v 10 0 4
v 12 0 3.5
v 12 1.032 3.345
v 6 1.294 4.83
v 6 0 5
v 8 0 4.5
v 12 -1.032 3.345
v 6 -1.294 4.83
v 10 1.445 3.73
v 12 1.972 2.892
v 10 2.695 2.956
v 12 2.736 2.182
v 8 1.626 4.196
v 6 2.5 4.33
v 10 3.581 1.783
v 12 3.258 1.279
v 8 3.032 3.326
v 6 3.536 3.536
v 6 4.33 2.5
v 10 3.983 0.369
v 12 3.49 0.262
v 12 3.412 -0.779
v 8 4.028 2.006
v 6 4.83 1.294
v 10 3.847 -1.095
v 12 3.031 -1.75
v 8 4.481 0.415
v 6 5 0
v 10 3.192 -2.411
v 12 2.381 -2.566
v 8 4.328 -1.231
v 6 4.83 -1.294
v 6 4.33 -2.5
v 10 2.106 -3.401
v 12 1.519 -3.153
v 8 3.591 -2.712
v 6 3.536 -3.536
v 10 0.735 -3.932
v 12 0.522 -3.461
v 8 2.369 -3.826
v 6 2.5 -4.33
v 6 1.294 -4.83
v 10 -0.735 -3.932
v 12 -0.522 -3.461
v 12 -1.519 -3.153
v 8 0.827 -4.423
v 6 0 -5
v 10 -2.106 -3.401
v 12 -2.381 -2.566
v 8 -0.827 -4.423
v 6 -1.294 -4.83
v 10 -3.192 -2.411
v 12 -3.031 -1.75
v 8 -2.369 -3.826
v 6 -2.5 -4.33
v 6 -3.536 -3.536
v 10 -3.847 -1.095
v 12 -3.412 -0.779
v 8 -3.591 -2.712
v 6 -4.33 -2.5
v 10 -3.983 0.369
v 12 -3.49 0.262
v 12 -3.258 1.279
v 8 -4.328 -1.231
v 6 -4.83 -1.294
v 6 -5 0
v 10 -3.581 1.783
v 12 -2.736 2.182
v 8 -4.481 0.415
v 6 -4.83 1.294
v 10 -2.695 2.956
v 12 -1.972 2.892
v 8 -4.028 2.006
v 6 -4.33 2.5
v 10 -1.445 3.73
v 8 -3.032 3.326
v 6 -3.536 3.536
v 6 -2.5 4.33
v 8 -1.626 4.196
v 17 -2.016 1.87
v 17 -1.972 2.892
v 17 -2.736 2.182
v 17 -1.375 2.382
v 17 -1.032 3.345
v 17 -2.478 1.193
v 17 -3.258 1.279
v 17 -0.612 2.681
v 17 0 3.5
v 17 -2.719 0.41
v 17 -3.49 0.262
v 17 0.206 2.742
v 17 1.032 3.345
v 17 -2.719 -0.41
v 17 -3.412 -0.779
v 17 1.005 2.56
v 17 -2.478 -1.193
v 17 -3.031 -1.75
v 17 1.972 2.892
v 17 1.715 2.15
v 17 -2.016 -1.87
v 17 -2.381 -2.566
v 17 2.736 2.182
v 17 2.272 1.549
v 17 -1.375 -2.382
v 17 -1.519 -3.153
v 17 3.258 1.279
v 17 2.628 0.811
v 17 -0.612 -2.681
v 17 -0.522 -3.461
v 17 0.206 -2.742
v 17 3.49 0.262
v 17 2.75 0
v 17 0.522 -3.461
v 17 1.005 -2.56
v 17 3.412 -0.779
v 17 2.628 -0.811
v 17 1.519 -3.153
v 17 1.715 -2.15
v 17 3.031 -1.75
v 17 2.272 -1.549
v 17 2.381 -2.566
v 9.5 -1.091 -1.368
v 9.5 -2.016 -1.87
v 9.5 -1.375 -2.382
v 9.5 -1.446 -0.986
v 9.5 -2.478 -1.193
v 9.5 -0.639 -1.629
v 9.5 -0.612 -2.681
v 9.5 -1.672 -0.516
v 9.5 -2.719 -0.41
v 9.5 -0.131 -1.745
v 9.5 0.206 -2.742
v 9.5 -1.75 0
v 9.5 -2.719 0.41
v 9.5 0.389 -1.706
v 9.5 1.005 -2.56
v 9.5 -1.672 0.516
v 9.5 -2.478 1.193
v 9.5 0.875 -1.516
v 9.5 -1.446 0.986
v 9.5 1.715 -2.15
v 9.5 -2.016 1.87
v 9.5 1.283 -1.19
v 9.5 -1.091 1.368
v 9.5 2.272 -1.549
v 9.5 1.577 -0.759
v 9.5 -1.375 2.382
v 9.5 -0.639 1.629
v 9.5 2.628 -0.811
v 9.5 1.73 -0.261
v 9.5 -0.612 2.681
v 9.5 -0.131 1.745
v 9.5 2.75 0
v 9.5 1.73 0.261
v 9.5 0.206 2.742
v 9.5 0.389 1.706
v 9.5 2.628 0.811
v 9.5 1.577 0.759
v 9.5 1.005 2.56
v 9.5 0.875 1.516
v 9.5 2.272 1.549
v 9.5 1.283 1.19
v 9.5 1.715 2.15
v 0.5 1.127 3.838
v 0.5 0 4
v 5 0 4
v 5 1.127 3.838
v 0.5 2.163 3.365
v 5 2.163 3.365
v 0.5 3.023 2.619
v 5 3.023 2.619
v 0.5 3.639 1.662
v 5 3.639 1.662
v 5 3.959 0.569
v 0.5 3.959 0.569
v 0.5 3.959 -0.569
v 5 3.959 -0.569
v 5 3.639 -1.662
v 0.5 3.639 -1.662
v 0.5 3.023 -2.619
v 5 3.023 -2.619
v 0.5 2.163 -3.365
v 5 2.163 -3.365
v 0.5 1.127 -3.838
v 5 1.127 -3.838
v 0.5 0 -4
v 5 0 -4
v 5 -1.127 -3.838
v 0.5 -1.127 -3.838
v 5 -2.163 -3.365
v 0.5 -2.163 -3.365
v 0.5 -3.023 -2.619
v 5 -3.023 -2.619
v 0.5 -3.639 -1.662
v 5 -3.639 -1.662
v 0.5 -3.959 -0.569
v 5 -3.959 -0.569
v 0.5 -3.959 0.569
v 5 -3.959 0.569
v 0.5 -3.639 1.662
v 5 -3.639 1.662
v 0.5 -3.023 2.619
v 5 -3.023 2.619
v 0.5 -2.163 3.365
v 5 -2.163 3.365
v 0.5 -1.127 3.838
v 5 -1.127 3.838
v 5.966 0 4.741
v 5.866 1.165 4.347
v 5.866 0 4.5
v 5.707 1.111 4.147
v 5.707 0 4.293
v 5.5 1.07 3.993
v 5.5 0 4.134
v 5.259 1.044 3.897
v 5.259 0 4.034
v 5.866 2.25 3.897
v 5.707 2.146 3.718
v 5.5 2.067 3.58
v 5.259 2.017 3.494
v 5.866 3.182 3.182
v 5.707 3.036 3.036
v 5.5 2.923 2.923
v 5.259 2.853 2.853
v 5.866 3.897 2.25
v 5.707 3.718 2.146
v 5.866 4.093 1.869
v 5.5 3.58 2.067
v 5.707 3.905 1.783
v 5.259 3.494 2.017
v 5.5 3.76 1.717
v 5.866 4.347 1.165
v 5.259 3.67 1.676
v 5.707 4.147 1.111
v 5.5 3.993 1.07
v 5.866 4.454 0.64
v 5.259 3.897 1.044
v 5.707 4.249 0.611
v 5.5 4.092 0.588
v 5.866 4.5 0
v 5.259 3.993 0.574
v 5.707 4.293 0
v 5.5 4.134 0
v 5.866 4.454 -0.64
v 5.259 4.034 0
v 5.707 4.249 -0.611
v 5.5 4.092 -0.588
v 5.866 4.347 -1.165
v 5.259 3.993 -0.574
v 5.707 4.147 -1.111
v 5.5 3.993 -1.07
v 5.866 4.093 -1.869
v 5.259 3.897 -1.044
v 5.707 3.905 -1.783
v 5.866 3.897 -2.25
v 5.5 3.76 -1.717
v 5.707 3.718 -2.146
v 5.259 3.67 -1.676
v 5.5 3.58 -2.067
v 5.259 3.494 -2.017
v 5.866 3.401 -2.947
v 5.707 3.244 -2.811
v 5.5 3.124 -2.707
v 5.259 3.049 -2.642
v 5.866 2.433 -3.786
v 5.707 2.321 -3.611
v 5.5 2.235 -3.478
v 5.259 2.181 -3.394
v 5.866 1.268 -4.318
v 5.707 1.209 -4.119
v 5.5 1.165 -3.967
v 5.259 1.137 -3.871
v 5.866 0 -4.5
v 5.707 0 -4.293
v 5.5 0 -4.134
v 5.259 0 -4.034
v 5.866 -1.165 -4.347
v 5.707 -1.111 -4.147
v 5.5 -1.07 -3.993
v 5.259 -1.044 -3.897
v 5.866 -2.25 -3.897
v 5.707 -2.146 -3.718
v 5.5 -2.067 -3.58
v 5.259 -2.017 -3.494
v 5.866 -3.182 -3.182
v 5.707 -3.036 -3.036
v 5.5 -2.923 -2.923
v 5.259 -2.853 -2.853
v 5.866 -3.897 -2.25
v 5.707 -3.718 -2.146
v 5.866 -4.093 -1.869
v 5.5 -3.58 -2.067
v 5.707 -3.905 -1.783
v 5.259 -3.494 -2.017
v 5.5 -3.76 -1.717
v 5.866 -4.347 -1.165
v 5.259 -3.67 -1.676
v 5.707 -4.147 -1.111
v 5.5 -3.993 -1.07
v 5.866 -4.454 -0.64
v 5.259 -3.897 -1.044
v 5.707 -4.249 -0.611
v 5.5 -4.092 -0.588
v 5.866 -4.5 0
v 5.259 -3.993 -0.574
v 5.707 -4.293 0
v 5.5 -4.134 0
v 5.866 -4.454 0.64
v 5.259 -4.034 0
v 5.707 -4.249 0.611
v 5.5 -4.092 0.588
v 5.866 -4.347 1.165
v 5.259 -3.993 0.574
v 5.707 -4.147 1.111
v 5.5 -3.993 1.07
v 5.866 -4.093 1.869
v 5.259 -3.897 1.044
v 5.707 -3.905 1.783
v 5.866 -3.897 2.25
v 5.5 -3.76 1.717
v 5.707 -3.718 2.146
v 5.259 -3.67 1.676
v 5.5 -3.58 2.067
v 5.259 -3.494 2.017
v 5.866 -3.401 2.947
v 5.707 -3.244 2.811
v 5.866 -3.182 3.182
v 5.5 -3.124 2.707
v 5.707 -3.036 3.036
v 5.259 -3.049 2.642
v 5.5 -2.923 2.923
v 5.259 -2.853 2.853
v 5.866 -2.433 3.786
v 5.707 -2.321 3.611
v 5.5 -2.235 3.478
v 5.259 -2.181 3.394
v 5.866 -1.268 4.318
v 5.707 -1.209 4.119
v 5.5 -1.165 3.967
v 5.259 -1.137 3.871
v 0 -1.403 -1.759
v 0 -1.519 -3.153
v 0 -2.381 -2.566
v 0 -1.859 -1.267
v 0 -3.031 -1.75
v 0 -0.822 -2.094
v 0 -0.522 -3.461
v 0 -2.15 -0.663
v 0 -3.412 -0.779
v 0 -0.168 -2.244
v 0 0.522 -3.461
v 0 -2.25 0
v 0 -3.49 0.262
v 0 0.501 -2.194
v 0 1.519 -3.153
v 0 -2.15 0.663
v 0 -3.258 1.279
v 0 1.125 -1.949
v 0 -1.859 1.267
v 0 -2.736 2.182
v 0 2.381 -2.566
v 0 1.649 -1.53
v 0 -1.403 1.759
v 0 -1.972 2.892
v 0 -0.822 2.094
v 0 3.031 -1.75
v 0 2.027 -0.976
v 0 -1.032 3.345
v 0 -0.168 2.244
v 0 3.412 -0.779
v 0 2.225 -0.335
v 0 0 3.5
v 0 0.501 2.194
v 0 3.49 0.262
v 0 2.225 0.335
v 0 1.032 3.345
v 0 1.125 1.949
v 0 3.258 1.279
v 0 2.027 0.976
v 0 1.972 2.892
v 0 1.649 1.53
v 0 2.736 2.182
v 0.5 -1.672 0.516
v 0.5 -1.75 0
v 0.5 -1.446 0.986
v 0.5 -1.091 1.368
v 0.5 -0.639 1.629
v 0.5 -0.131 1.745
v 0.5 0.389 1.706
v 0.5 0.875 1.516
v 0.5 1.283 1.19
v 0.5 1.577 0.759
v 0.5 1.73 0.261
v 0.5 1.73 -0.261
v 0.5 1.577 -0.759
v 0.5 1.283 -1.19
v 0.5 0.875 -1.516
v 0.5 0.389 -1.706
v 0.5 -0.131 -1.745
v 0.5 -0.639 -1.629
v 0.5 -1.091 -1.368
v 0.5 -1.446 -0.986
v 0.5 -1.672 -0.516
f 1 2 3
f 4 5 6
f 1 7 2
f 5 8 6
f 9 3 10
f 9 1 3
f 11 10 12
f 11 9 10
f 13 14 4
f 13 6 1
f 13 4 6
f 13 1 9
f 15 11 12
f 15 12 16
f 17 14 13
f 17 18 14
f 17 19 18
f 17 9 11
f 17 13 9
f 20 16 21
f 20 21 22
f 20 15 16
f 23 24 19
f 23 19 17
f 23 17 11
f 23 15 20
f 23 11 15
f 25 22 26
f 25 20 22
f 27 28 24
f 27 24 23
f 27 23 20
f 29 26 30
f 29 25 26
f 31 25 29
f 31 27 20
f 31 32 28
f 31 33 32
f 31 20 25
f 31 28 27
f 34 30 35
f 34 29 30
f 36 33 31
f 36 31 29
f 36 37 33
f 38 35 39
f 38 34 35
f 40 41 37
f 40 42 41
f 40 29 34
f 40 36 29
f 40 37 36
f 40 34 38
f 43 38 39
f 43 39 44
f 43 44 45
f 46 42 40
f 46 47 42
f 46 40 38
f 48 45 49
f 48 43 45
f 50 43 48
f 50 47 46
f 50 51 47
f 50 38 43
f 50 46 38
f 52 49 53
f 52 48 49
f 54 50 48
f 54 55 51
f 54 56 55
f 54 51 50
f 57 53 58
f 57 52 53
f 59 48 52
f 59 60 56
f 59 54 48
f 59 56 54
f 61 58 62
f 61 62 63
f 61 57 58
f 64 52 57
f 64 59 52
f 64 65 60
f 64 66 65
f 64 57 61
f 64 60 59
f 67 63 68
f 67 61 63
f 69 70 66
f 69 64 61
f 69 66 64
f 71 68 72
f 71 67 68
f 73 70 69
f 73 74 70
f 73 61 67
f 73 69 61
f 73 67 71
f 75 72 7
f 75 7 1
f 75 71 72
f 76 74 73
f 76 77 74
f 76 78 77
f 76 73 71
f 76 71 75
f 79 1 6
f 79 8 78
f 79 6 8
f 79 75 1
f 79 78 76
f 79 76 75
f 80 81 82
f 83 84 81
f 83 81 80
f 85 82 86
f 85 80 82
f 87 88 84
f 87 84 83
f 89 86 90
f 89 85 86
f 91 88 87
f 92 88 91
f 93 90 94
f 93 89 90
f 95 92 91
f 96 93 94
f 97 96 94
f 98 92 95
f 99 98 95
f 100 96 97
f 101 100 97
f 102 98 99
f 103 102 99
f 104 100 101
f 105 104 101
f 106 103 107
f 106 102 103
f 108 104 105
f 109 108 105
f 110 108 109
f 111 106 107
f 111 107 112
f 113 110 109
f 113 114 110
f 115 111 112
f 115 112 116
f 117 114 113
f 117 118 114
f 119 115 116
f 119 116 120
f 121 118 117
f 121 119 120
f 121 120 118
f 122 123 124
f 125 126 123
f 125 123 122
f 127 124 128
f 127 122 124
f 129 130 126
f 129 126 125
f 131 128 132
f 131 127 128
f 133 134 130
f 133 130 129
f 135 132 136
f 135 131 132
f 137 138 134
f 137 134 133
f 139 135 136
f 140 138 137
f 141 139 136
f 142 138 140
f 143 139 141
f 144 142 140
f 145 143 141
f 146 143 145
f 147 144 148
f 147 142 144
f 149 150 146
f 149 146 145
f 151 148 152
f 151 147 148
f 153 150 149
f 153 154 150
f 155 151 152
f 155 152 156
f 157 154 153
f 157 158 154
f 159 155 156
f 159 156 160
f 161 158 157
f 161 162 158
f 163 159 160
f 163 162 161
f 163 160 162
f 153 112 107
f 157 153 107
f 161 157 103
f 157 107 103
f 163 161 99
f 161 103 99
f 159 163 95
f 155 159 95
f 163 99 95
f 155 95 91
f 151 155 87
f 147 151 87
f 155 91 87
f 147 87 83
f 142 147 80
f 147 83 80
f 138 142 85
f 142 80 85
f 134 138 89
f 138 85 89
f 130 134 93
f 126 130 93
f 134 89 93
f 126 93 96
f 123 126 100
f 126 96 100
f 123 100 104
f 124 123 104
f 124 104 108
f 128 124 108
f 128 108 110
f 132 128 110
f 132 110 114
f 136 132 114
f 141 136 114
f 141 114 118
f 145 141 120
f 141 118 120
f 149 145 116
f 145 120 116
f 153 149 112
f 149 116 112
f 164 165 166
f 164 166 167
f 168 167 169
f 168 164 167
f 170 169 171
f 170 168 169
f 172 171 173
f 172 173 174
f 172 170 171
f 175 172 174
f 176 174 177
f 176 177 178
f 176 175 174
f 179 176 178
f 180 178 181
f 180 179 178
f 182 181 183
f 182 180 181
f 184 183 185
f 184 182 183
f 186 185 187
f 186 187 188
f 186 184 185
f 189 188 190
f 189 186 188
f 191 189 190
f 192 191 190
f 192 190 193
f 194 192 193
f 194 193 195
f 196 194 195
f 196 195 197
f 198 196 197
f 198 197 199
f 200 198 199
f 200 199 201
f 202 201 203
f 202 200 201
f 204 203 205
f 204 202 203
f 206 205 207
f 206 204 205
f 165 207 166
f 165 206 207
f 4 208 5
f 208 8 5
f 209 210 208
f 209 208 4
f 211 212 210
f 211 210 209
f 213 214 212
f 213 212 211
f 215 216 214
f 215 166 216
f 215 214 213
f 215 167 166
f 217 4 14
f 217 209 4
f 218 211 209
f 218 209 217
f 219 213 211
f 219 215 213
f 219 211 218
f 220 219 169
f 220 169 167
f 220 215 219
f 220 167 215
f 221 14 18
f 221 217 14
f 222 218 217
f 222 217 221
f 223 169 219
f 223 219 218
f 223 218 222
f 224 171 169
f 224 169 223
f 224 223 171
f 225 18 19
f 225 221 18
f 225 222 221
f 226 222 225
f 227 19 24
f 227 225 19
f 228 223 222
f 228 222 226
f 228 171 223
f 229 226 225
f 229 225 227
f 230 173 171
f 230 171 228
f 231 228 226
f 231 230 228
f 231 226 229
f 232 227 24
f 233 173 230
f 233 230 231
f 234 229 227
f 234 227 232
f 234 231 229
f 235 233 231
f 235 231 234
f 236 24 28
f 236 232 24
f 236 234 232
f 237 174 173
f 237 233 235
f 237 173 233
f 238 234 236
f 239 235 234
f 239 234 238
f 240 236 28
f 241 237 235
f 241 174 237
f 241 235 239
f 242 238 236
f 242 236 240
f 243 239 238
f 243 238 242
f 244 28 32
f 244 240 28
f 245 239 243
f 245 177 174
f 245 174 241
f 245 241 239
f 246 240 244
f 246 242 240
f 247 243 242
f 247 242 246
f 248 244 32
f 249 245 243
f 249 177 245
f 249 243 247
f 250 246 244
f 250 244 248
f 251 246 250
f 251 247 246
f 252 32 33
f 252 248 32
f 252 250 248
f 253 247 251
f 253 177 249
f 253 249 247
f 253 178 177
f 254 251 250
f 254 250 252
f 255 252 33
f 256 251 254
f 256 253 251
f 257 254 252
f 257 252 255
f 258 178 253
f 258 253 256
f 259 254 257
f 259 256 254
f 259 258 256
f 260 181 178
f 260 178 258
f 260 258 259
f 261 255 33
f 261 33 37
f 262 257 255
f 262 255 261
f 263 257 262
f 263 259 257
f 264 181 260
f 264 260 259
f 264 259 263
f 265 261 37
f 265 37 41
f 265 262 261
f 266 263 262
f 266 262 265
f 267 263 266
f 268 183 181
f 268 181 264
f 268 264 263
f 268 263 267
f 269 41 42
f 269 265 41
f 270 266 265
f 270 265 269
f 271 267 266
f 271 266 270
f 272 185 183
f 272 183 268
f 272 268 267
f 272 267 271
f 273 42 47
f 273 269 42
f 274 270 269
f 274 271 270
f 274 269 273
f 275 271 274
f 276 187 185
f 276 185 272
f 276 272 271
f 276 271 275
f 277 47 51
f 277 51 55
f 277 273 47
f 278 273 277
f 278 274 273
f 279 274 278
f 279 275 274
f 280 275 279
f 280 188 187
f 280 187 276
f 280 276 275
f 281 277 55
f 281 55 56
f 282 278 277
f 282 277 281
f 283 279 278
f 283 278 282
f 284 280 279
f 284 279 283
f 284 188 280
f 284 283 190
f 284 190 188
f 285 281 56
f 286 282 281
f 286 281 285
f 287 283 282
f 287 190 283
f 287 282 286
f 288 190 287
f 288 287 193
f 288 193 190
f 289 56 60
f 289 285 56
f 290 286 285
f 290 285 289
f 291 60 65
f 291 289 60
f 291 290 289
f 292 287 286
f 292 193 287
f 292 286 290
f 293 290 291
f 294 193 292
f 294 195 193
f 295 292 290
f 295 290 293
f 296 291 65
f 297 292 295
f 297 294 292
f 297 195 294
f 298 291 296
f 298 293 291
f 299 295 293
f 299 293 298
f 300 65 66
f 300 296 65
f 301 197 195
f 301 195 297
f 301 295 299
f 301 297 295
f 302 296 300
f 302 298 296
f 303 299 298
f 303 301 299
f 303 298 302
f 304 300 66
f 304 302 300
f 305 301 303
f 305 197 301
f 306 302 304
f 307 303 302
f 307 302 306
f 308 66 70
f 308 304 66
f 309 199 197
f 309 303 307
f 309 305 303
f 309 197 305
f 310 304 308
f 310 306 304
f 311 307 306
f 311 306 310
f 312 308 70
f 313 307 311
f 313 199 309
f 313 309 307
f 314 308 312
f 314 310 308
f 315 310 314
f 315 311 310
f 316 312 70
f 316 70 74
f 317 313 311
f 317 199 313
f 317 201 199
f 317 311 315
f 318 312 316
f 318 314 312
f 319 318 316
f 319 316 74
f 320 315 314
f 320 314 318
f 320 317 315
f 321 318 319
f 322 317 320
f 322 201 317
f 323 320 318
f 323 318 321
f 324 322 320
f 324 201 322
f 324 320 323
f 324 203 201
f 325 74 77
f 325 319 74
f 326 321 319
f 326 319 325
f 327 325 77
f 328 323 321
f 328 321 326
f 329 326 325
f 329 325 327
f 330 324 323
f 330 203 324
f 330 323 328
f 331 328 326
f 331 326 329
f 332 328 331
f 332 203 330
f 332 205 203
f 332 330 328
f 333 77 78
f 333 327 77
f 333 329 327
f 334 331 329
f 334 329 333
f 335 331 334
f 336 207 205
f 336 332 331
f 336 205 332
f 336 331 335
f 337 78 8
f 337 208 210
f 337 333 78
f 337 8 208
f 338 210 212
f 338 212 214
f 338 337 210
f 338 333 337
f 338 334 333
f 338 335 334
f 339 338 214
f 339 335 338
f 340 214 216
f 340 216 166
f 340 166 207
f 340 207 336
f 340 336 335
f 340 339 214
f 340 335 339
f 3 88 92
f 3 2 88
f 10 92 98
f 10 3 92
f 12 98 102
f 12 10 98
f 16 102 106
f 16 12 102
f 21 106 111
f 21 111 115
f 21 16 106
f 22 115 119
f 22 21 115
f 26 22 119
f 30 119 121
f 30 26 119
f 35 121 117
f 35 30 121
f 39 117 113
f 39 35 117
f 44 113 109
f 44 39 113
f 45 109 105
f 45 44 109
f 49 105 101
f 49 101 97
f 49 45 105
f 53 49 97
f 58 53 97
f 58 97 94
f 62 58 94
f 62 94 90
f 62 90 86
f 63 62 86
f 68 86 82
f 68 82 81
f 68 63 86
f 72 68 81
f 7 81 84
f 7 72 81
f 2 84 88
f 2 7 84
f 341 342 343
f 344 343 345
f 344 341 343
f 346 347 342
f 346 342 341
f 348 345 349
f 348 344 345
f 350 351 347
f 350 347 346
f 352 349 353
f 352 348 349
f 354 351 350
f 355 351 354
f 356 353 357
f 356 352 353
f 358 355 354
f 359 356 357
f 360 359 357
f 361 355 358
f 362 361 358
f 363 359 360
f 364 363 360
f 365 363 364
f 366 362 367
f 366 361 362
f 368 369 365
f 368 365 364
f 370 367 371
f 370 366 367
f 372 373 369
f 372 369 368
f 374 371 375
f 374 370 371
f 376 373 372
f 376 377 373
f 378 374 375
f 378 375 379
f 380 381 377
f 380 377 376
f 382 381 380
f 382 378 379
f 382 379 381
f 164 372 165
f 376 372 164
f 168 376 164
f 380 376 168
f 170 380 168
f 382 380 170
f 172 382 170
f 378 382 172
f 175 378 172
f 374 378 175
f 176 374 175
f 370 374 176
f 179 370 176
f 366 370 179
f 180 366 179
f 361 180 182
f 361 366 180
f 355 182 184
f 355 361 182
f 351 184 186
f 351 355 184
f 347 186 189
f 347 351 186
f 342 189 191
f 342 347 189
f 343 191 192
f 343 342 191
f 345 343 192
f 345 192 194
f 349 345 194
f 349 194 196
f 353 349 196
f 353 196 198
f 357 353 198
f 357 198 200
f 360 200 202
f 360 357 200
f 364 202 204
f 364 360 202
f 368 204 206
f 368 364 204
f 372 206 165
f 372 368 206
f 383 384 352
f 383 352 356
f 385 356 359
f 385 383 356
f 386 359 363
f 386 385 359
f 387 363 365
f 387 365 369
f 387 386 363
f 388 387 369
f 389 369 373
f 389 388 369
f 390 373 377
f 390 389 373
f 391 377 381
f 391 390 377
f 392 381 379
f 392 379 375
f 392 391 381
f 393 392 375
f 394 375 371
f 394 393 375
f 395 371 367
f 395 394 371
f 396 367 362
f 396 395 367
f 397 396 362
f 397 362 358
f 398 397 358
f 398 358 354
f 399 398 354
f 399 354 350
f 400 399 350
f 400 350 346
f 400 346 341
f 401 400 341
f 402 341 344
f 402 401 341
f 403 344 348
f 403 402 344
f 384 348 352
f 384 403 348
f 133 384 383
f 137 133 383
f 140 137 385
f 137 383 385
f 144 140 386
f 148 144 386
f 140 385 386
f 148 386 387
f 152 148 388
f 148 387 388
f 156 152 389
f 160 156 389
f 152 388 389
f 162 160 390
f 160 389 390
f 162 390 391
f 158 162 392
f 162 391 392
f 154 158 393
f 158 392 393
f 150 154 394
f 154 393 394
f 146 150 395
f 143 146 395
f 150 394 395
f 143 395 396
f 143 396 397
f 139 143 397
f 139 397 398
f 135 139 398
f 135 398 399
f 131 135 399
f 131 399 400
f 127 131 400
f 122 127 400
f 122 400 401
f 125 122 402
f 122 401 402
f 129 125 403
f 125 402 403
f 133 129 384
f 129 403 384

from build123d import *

# Parameters (mm, degrees)
F2_R     = 0.99999
F3_R     = 2.75
F4_DEPTH = 7.5
F5_R     = 1.75
F6_DEPTH = 9.5
F7_SIZE  = 0.5


# Not quite as in the source:
# - a fillet or chamfer is up to 0.001 mm smaller than in the source, because OpenCascade refuses the exact size


with BuildPart() as f1:
    # F0 (on Front) → F1 (revolve)
    with BuildSketch(Plane.XZ):
        Polygon((0, 4), (0, 0), (17, 0), (17, 3.5), (12, 3.5), (6, 5), (6, 4), align=None)
    revolve(axis=Axis((8.5, 0, 0), (-1, 0, 0)))

    # F2 (radius 1 in the source; OpenCascade refuses exactly that, so slightly less here)
    f2_edges = [f1.edges().sort_by_distance(p)[0] for p in [
        (6, 0, -4),
    ]]
    fillet(f2_edges, radius=F2_R)

    # F3 (on face) → F4 (cut)
    with BuildSketch(Plane.YZ.offset(17)):
        Circle(F3_R)
    extrude(amount=-F4_DEPTH, mode=Mode.SUBTRACT)

    # F5 (on face) → F6 (cut, through all)
    with BuildSketch(Plane(origin=(0, 0, 0), x_dir=(0, -1, 0), z_dir=(-1, 0, 0))):
        Circle(F5_R)
    extrude(amount=-F6_DEPTH, mode=Mode.SUBTRACT)

    # F7
    f7_edges = [f1.edges().sort_by_distance(p)[0] for p in [
        (0, 0, -4),
        (0, 1.75, 0),
    ]]
    chamfer(f7_edges, length=F7_SIZE)


solid = f1.part
